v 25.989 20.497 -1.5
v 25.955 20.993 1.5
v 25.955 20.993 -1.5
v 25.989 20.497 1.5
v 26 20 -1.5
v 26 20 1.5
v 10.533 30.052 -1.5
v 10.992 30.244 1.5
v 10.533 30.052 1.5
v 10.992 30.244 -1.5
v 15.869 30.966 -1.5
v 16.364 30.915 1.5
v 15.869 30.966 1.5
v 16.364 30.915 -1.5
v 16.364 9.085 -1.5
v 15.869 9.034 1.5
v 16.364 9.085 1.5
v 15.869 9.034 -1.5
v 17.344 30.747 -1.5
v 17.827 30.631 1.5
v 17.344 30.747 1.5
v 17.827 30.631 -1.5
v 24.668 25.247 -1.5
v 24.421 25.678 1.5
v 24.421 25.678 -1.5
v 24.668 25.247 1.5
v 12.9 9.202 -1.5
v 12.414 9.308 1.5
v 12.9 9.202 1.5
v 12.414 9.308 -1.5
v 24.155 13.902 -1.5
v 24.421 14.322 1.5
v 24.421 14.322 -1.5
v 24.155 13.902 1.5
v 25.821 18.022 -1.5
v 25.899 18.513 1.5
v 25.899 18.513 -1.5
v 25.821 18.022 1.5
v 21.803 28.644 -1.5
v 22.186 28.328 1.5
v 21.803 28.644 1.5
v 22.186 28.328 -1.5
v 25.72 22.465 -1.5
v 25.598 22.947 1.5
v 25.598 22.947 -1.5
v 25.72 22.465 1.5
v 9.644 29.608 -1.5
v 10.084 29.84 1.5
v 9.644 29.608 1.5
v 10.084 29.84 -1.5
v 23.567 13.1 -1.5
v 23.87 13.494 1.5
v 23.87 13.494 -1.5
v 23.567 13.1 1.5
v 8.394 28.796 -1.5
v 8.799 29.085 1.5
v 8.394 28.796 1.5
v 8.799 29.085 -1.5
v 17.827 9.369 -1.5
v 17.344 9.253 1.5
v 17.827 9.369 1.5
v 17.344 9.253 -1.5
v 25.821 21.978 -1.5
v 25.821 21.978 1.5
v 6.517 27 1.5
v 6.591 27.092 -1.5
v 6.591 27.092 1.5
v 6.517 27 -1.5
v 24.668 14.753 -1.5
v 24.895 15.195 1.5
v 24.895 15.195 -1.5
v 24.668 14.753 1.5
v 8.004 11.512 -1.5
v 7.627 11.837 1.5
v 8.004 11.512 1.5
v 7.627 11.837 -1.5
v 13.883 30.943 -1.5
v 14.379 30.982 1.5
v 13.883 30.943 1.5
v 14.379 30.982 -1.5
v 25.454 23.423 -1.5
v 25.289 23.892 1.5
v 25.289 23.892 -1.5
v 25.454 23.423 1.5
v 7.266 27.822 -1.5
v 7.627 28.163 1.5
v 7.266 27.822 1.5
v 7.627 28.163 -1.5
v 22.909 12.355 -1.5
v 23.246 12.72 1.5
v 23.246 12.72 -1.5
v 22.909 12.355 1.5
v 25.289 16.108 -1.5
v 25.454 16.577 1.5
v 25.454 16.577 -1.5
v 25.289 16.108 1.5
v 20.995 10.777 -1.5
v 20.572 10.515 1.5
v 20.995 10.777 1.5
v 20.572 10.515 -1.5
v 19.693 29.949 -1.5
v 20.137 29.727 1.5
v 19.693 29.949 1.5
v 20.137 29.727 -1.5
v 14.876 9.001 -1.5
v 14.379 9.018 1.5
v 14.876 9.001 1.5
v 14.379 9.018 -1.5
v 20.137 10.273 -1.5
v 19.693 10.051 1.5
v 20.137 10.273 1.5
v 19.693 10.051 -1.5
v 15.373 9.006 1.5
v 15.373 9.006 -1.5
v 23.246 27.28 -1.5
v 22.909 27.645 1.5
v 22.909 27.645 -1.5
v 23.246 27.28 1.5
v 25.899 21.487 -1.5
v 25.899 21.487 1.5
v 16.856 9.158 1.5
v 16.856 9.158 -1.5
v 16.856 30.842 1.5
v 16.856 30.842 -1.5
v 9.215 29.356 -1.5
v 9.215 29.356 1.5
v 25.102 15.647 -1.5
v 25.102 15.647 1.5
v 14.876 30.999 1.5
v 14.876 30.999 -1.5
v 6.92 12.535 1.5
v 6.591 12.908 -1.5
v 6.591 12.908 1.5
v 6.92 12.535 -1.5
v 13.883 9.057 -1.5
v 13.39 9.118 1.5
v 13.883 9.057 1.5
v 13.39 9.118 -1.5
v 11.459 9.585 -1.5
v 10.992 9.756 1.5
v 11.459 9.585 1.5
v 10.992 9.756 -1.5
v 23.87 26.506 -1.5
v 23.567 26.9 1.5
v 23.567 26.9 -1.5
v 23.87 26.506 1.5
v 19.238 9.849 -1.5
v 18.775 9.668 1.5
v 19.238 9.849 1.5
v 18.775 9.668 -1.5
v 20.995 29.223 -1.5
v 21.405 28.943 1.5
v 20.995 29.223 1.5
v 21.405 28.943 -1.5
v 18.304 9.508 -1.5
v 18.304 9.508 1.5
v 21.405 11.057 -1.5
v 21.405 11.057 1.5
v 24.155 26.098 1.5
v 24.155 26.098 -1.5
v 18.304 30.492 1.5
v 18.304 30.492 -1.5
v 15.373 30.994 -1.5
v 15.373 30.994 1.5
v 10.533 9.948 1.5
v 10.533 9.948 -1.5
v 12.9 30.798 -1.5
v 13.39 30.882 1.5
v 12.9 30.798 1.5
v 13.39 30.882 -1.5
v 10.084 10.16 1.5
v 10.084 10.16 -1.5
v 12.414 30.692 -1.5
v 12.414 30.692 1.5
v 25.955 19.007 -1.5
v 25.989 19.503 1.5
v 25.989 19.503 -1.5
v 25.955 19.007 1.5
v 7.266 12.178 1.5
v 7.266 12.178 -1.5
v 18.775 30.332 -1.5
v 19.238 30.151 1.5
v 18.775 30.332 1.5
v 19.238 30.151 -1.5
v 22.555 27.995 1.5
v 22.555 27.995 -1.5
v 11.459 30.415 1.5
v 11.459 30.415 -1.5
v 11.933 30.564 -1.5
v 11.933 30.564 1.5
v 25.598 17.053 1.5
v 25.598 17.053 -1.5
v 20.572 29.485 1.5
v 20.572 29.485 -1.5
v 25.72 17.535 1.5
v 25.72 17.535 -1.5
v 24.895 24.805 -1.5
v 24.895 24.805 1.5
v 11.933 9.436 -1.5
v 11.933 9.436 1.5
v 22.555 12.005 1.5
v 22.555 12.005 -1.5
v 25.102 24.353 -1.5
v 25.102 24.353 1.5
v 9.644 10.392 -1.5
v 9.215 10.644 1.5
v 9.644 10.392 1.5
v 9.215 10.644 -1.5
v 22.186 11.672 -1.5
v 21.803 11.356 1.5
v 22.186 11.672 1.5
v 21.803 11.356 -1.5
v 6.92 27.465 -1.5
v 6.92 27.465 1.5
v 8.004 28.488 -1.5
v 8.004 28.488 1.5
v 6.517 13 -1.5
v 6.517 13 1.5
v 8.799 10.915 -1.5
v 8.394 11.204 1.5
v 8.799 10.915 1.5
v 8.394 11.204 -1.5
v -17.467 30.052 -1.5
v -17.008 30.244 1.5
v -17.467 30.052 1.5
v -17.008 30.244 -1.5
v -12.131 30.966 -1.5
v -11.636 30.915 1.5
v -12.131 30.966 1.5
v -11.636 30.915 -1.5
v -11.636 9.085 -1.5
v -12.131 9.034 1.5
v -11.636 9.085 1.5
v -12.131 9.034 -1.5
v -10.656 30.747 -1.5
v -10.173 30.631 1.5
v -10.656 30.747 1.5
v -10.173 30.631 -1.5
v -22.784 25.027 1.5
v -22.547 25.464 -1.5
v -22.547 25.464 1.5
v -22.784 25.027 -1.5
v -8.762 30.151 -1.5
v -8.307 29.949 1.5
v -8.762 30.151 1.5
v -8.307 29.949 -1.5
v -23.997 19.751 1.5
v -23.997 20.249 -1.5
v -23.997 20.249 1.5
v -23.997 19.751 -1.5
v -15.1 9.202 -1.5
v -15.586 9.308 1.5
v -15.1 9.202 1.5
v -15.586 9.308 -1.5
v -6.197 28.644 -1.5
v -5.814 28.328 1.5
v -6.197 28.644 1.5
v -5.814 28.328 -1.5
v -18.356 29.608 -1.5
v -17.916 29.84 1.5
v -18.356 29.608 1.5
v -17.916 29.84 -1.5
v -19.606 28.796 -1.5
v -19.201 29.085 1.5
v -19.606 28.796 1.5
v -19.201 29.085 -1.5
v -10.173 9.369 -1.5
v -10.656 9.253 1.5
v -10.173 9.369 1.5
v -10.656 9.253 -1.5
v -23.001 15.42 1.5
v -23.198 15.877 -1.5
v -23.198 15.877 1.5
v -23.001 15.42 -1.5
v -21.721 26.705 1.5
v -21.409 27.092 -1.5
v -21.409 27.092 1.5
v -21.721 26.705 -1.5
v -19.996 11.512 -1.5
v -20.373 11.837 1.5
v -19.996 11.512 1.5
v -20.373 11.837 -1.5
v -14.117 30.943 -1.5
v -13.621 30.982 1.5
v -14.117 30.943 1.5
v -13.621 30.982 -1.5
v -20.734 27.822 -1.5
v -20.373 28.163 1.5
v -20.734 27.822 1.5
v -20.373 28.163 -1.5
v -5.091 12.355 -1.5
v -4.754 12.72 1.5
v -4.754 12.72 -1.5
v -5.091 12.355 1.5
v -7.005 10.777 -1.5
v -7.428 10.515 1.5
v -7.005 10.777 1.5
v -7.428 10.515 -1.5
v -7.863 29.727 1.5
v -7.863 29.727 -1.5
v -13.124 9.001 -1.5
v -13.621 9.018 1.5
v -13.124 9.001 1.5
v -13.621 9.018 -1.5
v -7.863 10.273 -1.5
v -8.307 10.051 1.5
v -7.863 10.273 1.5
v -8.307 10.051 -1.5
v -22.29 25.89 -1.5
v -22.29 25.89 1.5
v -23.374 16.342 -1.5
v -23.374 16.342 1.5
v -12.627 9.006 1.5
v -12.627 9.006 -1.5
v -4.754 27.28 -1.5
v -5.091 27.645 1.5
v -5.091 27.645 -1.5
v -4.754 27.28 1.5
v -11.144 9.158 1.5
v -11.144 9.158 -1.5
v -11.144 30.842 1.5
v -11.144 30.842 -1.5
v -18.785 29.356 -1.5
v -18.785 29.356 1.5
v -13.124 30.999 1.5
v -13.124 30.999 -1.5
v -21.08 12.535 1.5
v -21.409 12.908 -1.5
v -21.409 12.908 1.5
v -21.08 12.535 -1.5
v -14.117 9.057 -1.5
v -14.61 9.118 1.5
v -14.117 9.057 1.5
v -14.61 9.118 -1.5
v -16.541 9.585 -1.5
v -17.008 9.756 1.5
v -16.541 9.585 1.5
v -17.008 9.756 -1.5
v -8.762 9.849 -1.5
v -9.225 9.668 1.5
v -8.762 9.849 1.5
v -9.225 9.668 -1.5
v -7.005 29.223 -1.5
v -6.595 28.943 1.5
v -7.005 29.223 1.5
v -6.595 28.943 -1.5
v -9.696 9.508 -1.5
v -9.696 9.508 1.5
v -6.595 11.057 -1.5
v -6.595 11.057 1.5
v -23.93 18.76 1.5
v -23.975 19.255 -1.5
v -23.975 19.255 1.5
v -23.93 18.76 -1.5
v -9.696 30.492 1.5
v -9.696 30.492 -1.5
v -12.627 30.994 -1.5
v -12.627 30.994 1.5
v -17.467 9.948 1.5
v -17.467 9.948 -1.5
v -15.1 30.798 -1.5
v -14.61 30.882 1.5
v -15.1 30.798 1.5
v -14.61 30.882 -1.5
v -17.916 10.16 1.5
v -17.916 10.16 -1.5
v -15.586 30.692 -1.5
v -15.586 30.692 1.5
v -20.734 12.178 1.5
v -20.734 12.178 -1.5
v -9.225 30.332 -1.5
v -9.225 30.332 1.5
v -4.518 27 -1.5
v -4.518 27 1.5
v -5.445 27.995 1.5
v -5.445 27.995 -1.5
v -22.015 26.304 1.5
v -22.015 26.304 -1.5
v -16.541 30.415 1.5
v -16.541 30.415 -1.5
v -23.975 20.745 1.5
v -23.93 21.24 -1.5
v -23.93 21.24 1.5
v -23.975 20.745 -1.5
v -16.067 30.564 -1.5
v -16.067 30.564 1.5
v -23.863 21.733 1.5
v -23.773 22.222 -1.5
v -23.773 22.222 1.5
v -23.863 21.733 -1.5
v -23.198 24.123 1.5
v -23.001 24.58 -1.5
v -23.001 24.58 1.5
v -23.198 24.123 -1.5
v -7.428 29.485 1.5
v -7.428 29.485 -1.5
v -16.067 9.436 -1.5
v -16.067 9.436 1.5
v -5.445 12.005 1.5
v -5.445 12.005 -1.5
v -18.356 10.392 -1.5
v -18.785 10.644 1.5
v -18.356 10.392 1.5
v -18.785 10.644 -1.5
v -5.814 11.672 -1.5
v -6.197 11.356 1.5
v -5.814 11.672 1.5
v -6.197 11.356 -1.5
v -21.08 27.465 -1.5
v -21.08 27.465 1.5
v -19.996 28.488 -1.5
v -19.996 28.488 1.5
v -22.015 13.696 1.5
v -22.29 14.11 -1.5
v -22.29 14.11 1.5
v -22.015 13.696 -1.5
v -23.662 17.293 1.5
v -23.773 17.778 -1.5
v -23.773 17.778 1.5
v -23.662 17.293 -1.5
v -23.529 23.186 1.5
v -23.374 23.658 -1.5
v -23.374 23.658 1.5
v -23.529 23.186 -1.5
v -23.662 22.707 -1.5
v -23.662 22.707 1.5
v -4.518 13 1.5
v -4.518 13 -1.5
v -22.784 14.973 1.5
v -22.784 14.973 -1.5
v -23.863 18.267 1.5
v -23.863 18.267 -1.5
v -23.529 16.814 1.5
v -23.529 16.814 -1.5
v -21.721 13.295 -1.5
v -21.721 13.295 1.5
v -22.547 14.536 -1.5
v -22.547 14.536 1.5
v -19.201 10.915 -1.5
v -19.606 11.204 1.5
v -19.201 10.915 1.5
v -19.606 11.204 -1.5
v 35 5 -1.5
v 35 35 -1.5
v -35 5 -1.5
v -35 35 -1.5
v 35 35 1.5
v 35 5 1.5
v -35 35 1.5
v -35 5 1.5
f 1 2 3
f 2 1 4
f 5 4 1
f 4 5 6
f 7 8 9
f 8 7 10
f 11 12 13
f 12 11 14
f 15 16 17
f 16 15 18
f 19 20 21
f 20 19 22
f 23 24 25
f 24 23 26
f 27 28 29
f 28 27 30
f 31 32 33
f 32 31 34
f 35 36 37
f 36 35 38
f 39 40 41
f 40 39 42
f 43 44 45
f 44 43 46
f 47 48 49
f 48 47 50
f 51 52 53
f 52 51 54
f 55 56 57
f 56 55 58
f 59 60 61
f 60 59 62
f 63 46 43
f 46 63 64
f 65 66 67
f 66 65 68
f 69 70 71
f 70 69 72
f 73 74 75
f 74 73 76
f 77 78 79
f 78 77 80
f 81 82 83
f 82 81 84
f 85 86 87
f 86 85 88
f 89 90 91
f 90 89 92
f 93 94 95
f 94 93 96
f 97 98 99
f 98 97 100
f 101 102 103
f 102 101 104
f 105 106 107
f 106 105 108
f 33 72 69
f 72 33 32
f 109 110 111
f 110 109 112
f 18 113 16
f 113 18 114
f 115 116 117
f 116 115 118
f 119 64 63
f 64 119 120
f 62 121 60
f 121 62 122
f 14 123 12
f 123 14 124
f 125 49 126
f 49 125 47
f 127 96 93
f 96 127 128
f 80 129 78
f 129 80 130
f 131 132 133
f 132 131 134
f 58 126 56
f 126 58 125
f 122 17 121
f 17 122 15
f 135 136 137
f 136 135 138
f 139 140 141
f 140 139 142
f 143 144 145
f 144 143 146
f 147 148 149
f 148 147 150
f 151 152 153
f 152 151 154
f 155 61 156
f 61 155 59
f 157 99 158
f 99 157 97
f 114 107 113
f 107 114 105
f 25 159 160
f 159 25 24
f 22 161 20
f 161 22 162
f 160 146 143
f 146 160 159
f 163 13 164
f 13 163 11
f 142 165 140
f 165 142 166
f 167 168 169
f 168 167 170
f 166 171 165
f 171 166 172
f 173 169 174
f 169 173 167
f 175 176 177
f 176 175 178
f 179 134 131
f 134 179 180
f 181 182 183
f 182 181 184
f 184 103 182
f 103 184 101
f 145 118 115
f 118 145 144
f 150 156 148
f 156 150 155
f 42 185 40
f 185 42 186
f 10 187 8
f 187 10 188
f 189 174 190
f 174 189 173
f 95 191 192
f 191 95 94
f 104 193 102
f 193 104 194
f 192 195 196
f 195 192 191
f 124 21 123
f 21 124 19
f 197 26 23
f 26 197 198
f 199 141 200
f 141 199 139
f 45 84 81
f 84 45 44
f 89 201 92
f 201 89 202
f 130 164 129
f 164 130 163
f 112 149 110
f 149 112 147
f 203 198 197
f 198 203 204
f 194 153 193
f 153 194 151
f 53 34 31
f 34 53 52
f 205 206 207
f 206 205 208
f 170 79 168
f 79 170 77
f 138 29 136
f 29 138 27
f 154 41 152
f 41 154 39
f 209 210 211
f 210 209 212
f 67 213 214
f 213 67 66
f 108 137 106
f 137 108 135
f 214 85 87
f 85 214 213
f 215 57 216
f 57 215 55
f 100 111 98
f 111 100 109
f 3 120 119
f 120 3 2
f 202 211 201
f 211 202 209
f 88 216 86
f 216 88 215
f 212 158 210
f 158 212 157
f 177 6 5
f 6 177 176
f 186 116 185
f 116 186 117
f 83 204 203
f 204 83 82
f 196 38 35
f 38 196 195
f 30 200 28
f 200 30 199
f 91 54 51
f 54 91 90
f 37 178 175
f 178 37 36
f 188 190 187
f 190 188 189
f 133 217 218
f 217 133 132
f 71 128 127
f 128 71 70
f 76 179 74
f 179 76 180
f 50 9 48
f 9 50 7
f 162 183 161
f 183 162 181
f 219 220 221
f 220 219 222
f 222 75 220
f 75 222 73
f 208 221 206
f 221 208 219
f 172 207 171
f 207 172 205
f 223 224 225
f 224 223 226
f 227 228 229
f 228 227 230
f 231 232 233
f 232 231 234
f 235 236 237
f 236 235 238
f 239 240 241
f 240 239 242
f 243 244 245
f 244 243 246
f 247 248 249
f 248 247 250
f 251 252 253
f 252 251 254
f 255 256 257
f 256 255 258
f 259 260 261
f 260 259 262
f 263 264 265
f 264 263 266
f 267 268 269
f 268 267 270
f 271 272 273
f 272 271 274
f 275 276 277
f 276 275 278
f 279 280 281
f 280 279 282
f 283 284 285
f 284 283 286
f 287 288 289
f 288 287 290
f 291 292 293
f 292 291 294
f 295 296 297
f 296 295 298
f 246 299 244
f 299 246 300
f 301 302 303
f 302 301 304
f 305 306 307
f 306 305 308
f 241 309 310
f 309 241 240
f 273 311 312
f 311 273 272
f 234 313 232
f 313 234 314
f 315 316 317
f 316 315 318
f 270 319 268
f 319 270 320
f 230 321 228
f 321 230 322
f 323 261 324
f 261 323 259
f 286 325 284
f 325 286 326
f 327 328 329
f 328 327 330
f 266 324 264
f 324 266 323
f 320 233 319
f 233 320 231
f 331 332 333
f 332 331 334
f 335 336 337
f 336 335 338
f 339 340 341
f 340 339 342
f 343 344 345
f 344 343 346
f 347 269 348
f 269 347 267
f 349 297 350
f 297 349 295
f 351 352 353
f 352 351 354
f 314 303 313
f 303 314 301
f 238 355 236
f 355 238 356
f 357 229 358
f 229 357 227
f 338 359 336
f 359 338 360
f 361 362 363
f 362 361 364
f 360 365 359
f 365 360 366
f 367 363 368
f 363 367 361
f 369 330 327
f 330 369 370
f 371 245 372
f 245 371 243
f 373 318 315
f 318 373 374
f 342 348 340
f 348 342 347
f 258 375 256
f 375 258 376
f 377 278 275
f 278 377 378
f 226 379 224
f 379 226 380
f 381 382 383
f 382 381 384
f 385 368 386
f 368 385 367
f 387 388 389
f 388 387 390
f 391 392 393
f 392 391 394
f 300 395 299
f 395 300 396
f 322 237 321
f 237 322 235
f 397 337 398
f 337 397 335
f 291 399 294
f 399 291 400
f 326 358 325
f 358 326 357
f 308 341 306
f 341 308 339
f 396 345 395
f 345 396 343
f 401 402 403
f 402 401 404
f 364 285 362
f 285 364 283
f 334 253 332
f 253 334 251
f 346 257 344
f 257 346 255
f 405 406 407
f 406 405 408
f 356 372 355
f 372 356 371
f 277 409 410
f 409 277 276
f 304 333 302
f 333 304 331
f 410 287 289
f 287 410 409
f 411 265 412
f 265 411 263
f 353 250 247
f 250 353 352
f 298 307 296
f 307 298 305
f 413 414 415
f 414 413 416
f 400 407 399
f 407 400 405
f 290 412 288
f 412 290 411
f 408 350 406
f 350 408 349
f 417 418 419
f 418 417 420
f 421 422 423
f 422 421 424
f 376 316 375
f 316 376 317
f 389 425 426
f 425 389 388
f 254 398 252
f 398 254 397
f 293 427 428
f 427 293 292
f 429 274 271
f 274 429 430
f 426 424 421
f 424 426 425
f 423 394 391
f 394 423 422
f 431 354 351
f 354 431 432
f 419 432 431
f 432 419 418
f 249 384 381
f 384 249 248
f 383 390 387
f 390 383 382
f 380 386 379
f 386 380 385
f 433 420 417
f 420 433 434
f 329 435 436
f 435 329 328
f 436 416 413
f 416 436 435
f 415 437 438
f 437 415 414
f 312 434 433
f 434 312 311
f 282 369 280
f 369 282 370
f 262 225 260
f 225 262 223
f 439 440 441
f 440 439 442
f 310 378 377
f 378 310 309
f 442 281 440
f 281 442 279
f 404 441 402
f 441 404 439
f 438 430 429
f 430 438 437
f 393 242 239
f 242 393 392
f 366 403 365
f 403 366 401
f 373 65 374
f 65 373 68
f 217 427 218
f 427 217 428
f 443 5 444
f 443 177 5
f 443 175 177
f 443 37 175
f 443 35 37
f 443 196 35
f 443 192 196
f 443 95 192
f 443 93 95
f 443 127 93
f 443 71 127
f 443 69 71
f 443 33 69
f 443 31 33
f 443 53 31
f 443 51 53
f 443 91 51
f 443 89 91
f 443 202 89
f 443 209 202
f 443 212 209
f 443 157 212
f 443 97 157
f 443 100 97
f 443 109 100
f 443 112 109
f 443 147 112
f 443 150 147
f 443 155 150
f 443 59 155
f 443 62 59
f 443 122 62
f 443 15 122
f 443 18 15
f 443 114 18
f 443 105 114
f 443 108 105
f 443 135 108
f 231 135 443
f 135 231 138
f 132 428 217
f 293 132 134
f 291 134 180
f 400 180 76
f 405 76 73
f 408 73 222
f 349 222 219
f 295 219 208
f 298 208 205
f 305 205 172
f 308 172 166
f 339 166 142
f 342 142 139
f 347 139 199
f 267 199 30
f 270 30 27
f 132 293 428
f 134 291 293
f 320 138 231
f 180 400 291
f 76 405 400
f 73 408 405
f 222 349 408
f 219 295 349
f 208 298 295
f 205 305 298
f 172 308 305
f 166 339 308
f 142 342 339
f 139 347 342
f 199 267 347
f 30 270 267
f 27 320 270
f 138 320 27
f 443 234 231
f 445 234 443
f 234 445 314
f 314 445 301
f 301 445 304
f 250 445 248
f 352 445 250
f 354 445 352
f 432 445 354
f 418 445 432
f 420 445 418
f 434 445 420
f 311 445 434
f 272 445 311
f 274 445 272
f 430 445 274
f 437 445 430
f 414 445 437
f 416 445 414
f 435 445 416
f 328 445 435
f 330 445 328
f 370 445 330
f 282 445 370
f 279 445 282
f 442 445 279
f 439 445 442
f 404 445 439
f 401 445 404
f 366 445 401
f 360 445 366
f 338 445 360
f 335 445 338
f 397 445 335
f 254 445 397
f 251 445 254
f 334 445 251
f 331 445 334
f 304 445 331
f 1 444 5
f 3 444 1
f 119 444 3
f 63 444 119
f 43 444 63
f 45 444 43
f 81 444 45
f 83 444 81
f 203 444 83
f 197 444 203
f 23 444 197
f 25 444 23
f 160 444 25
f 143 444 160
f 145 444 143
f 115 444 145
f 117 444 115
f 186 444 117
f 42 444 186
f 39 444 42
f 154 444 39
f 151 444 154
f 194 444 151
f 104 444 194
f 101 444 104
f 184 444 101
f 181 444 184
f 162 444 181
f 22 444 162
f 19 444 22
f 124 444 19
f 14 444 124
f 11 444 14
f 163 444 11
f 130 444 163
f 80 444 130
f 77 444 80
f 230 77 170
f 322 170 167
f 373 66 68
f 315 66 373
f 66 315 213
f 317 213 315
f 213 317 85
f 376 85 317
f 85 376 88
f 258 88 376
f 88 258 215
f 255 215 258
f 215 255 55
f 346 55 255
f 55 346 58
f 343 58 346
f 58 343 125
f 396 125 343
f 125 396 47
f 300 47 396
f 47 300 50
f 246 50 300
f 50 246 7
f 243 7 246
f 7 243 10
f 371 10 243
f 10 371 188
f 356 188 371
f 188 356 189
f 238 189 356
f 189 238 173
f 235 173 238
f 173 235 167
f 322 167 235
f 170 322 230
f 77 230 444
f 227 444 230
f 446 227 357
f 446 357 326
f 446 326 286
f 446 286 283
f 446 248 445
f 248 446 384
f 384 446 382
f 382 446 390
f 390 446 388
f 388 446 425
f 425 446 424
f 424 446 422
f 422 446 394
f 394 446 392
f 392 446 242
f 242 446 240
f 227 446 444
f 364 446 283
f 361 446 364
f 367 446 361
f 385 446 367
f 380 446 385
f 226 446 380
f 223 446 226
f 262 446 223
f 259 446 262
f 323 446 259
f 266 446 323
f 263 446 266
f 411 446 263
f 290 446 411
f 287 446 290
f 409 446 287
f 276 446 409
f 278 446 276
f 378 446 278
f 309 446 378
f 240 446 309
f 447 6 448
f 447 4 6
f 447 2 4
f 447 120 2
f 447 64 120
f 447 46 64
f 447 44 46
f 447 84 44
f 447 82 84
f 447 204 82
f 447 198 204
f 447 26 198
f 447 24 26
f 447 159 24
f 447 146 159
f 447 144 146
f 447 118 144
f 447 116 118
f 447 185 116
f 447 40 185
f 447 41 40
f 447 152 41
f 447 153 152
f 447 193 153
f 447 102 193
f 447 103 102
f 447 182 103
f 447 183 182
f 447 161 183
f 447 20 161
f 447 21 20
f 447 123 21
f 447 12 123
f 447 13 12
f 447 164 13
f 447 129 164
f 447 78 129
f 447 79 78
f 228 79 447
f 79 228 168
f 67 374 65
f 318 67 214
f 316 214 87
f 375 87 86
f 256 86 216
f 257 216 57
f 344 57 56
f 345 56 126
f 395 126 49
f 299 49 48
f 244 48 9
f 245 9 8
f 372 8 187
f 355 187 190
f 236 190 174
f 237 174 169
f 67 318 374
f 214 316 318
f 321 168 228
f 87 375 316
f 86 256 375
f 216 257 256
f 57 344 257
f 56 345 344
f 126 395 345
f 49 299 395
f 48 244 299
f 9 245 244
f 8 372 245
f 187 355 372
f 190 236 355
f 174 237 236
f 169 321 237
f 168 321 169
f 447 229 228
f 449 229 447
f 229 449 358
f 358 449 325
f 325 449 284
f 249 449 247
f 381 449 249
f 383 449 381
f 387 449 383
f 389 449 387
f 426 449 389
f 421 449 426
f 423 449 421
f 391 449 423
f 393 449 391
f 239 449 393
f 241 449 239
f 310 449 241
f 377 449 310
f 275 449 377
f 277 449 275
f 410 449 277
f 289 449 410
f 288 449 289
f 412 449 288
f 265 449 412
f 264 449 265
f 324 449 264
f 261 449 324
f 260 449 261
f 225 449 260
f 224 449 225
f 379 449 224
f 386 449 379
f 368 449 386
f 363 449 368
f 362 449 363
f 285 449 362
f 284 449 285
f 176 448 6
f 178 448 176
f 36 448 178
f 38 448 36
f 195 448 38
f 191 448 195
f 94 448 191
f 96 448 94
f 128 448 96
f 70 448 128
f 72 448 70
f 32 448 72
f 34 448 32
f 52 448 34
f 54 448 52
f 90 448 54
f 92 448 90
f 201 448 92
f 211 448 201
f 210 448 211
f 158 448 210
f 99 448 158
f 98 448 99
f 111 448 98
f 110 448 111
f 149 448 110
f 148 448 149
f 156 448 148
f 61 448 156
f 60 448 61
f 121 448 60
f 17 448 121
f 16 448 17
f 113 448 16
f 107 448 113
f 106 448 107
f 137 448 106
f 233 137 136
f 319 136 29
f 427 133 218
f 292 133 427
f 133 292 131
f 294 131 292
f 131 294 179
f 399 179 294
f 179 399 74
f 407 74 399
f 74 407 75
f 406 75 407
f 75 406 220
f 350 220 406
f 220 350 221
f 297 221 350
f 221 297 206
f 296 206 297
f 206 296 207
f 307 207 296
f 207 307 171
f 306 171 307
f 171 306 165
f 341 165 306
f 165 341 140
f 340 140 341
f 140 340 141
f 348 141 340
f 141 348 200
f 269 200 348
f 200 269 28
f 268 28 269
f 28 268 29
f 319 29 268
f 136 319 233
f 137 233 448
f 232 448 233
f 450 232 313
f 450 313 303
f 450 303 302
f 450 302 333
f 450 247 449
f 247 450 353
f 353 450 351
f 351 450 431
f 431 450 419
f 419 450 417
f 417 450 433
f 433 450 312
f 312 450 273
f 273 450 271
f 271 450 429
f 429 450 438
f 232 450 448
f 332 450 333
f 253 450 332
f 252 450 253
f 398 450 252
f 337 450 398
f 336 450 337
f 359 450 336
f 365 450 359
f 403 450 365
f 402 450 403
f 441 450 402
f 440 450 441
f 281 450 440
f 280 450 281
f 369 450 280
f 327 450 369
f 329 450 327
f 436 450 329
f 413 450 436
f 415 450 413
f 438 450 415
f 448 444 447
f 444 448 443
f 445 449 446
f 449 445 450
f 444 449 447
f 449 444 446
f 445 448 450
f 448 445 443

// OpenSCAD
$fa=0.5;
$fs=0.5;


// 38mm spacers

module corner(radius=4, height=3) {
    cylinder(r=radius, h=height, center=true);
}

module baseCorners(width=32.5, height=32.5, padding=0, z=0) {
    for (x=[width+padding, -width-padding]) { 
        for (y=[height+padding, -height-padding]) { 
            translate([x, y, z])
            corner(radius=2.75, height=10);
        }
    }
}

module spacer(radius=2.75, thickness=1.25, height=38) {
    difference() {
        cylinder(r=radius+thickness, height, center=true);
        cylinder(r=radius, 110, center=true);
    }
}

module kittycam (render_spacer=false,
                    spacer_height=38,
                    render_bottom_plate=true,
                    render_middle_plate=true,
                    render_top_plate=true) {
                        
    if (render_spacer) {
        spacer(height=spacer_height);
    } else {
        
        difference() {
        
            // RPi footprint = 100mm = 3.93 inches
            RPiSize = 100;
            wallThickness = 3;
            hullCornerRadius = 4;
            size = (RPiSize / 2) - hullCornerRadius; // subtract the hull corner radius
            hull() {
                for (x=[size, -size]) { 
                    for (y=[size, -size]) { 
                        translate([x, y, 0])
                            cylinder(r=4, h=wallThickness, center=true);
                    }
                }
            }
        
            if (render_bottom_plate) {
                
                // RPi mounting holes
                translate([-12, 0, 0]) 
                    for (x=[29.25, -29.25]) 
                        for (y=[24.75, -24.75])
                            translate([x, y, 0]) 
                                cylinder(r=1.825, h=10, center=true);
            }
            
            if (render_middle_plate) {
                    
                // lidar
                translate([0, 20, 0])   // was 20, 20, 0
                    for (x=[15, -15])
                        for (y=[10 + 4, -10 - 4])
                            translate([x, y, 0])
                                cylinder(r=2, h=10, center=true);
                // lidar slot        
                translate([0, 44, 0])     
                     cube([20, 2, 20], center=true);   
                        
                // protoboard 45.5mm x 25.4mm
                translate([0, -20, 0])
                    for (x=[22.75, -22.75])
                        for (y=[12.7, -12.7])
                            translate([x, y, 0])
                                cylinder(r=1.75, h=10, center=true);
                
                // camera slot        
                cube([20, 2, 20], center=true);
            }
            
            
            if (render_top_plate) {
                
                // camera mounts
                translate([0, -6, 0]) // was -30, 18, 0
                    for (x=[10.5, -10.5]) 
                        for (y=[6, -6])
                            translate([x, y, 0])
                                cylinder(r=1.5, h=10, center=true);
          
                // camera lens
                color([1, 0, 0])
                    translate([0, 0, 0])
                        cube(9, true);
        
                // lidar hole
                translate([0, 20, 0])   // was 20, 20, 0
                        cube([24, 14, 12], center=true);
                
                translate([0, 20, 0]) 
                    for (x=[15, -13])    
                        translate([x, 0, 0])
                            cylinder(r=11, h=10, center=true);   
   
   
                // LEDs
                translate([10.5, -42, 0])
                    cylinder(r=1.75, h=10, center=true);
        
                translate([-10.5, -42, 0])
                    cylinder(r=1.75, h=10, center=true);
        
            }
         
            // corners
            cornerRadius = 2.85; // M5 hex nut has a 5mm wide bolt
            c = RPiSize / 2 - cornerRadius * 2;
            for (x=[c, -c])
                for (y=[c, -c])
                    translate([x, y, 0])
                        cylinder(r=cornerRadius, h=10, center=true);
                
                
            translate([60, 0, 0])
                cube([50, 100, 10], center=true);
                
            translate([-60, 0, 0])
                cube([50, 100, 10], center=true);
                
            translate([0, 60, 0])
                cube([100, 50, 10], center=true);
                
            translate([0, -25, 0])
                cube([100, 60, 10], center=true);
                
        }
    }
}

kittycam(render_spacer=false,
            spacer_height=38,
            render_bottom_plate=false,
            render_middle_plate=false,
            render_top_plate=true);


    
    
    
